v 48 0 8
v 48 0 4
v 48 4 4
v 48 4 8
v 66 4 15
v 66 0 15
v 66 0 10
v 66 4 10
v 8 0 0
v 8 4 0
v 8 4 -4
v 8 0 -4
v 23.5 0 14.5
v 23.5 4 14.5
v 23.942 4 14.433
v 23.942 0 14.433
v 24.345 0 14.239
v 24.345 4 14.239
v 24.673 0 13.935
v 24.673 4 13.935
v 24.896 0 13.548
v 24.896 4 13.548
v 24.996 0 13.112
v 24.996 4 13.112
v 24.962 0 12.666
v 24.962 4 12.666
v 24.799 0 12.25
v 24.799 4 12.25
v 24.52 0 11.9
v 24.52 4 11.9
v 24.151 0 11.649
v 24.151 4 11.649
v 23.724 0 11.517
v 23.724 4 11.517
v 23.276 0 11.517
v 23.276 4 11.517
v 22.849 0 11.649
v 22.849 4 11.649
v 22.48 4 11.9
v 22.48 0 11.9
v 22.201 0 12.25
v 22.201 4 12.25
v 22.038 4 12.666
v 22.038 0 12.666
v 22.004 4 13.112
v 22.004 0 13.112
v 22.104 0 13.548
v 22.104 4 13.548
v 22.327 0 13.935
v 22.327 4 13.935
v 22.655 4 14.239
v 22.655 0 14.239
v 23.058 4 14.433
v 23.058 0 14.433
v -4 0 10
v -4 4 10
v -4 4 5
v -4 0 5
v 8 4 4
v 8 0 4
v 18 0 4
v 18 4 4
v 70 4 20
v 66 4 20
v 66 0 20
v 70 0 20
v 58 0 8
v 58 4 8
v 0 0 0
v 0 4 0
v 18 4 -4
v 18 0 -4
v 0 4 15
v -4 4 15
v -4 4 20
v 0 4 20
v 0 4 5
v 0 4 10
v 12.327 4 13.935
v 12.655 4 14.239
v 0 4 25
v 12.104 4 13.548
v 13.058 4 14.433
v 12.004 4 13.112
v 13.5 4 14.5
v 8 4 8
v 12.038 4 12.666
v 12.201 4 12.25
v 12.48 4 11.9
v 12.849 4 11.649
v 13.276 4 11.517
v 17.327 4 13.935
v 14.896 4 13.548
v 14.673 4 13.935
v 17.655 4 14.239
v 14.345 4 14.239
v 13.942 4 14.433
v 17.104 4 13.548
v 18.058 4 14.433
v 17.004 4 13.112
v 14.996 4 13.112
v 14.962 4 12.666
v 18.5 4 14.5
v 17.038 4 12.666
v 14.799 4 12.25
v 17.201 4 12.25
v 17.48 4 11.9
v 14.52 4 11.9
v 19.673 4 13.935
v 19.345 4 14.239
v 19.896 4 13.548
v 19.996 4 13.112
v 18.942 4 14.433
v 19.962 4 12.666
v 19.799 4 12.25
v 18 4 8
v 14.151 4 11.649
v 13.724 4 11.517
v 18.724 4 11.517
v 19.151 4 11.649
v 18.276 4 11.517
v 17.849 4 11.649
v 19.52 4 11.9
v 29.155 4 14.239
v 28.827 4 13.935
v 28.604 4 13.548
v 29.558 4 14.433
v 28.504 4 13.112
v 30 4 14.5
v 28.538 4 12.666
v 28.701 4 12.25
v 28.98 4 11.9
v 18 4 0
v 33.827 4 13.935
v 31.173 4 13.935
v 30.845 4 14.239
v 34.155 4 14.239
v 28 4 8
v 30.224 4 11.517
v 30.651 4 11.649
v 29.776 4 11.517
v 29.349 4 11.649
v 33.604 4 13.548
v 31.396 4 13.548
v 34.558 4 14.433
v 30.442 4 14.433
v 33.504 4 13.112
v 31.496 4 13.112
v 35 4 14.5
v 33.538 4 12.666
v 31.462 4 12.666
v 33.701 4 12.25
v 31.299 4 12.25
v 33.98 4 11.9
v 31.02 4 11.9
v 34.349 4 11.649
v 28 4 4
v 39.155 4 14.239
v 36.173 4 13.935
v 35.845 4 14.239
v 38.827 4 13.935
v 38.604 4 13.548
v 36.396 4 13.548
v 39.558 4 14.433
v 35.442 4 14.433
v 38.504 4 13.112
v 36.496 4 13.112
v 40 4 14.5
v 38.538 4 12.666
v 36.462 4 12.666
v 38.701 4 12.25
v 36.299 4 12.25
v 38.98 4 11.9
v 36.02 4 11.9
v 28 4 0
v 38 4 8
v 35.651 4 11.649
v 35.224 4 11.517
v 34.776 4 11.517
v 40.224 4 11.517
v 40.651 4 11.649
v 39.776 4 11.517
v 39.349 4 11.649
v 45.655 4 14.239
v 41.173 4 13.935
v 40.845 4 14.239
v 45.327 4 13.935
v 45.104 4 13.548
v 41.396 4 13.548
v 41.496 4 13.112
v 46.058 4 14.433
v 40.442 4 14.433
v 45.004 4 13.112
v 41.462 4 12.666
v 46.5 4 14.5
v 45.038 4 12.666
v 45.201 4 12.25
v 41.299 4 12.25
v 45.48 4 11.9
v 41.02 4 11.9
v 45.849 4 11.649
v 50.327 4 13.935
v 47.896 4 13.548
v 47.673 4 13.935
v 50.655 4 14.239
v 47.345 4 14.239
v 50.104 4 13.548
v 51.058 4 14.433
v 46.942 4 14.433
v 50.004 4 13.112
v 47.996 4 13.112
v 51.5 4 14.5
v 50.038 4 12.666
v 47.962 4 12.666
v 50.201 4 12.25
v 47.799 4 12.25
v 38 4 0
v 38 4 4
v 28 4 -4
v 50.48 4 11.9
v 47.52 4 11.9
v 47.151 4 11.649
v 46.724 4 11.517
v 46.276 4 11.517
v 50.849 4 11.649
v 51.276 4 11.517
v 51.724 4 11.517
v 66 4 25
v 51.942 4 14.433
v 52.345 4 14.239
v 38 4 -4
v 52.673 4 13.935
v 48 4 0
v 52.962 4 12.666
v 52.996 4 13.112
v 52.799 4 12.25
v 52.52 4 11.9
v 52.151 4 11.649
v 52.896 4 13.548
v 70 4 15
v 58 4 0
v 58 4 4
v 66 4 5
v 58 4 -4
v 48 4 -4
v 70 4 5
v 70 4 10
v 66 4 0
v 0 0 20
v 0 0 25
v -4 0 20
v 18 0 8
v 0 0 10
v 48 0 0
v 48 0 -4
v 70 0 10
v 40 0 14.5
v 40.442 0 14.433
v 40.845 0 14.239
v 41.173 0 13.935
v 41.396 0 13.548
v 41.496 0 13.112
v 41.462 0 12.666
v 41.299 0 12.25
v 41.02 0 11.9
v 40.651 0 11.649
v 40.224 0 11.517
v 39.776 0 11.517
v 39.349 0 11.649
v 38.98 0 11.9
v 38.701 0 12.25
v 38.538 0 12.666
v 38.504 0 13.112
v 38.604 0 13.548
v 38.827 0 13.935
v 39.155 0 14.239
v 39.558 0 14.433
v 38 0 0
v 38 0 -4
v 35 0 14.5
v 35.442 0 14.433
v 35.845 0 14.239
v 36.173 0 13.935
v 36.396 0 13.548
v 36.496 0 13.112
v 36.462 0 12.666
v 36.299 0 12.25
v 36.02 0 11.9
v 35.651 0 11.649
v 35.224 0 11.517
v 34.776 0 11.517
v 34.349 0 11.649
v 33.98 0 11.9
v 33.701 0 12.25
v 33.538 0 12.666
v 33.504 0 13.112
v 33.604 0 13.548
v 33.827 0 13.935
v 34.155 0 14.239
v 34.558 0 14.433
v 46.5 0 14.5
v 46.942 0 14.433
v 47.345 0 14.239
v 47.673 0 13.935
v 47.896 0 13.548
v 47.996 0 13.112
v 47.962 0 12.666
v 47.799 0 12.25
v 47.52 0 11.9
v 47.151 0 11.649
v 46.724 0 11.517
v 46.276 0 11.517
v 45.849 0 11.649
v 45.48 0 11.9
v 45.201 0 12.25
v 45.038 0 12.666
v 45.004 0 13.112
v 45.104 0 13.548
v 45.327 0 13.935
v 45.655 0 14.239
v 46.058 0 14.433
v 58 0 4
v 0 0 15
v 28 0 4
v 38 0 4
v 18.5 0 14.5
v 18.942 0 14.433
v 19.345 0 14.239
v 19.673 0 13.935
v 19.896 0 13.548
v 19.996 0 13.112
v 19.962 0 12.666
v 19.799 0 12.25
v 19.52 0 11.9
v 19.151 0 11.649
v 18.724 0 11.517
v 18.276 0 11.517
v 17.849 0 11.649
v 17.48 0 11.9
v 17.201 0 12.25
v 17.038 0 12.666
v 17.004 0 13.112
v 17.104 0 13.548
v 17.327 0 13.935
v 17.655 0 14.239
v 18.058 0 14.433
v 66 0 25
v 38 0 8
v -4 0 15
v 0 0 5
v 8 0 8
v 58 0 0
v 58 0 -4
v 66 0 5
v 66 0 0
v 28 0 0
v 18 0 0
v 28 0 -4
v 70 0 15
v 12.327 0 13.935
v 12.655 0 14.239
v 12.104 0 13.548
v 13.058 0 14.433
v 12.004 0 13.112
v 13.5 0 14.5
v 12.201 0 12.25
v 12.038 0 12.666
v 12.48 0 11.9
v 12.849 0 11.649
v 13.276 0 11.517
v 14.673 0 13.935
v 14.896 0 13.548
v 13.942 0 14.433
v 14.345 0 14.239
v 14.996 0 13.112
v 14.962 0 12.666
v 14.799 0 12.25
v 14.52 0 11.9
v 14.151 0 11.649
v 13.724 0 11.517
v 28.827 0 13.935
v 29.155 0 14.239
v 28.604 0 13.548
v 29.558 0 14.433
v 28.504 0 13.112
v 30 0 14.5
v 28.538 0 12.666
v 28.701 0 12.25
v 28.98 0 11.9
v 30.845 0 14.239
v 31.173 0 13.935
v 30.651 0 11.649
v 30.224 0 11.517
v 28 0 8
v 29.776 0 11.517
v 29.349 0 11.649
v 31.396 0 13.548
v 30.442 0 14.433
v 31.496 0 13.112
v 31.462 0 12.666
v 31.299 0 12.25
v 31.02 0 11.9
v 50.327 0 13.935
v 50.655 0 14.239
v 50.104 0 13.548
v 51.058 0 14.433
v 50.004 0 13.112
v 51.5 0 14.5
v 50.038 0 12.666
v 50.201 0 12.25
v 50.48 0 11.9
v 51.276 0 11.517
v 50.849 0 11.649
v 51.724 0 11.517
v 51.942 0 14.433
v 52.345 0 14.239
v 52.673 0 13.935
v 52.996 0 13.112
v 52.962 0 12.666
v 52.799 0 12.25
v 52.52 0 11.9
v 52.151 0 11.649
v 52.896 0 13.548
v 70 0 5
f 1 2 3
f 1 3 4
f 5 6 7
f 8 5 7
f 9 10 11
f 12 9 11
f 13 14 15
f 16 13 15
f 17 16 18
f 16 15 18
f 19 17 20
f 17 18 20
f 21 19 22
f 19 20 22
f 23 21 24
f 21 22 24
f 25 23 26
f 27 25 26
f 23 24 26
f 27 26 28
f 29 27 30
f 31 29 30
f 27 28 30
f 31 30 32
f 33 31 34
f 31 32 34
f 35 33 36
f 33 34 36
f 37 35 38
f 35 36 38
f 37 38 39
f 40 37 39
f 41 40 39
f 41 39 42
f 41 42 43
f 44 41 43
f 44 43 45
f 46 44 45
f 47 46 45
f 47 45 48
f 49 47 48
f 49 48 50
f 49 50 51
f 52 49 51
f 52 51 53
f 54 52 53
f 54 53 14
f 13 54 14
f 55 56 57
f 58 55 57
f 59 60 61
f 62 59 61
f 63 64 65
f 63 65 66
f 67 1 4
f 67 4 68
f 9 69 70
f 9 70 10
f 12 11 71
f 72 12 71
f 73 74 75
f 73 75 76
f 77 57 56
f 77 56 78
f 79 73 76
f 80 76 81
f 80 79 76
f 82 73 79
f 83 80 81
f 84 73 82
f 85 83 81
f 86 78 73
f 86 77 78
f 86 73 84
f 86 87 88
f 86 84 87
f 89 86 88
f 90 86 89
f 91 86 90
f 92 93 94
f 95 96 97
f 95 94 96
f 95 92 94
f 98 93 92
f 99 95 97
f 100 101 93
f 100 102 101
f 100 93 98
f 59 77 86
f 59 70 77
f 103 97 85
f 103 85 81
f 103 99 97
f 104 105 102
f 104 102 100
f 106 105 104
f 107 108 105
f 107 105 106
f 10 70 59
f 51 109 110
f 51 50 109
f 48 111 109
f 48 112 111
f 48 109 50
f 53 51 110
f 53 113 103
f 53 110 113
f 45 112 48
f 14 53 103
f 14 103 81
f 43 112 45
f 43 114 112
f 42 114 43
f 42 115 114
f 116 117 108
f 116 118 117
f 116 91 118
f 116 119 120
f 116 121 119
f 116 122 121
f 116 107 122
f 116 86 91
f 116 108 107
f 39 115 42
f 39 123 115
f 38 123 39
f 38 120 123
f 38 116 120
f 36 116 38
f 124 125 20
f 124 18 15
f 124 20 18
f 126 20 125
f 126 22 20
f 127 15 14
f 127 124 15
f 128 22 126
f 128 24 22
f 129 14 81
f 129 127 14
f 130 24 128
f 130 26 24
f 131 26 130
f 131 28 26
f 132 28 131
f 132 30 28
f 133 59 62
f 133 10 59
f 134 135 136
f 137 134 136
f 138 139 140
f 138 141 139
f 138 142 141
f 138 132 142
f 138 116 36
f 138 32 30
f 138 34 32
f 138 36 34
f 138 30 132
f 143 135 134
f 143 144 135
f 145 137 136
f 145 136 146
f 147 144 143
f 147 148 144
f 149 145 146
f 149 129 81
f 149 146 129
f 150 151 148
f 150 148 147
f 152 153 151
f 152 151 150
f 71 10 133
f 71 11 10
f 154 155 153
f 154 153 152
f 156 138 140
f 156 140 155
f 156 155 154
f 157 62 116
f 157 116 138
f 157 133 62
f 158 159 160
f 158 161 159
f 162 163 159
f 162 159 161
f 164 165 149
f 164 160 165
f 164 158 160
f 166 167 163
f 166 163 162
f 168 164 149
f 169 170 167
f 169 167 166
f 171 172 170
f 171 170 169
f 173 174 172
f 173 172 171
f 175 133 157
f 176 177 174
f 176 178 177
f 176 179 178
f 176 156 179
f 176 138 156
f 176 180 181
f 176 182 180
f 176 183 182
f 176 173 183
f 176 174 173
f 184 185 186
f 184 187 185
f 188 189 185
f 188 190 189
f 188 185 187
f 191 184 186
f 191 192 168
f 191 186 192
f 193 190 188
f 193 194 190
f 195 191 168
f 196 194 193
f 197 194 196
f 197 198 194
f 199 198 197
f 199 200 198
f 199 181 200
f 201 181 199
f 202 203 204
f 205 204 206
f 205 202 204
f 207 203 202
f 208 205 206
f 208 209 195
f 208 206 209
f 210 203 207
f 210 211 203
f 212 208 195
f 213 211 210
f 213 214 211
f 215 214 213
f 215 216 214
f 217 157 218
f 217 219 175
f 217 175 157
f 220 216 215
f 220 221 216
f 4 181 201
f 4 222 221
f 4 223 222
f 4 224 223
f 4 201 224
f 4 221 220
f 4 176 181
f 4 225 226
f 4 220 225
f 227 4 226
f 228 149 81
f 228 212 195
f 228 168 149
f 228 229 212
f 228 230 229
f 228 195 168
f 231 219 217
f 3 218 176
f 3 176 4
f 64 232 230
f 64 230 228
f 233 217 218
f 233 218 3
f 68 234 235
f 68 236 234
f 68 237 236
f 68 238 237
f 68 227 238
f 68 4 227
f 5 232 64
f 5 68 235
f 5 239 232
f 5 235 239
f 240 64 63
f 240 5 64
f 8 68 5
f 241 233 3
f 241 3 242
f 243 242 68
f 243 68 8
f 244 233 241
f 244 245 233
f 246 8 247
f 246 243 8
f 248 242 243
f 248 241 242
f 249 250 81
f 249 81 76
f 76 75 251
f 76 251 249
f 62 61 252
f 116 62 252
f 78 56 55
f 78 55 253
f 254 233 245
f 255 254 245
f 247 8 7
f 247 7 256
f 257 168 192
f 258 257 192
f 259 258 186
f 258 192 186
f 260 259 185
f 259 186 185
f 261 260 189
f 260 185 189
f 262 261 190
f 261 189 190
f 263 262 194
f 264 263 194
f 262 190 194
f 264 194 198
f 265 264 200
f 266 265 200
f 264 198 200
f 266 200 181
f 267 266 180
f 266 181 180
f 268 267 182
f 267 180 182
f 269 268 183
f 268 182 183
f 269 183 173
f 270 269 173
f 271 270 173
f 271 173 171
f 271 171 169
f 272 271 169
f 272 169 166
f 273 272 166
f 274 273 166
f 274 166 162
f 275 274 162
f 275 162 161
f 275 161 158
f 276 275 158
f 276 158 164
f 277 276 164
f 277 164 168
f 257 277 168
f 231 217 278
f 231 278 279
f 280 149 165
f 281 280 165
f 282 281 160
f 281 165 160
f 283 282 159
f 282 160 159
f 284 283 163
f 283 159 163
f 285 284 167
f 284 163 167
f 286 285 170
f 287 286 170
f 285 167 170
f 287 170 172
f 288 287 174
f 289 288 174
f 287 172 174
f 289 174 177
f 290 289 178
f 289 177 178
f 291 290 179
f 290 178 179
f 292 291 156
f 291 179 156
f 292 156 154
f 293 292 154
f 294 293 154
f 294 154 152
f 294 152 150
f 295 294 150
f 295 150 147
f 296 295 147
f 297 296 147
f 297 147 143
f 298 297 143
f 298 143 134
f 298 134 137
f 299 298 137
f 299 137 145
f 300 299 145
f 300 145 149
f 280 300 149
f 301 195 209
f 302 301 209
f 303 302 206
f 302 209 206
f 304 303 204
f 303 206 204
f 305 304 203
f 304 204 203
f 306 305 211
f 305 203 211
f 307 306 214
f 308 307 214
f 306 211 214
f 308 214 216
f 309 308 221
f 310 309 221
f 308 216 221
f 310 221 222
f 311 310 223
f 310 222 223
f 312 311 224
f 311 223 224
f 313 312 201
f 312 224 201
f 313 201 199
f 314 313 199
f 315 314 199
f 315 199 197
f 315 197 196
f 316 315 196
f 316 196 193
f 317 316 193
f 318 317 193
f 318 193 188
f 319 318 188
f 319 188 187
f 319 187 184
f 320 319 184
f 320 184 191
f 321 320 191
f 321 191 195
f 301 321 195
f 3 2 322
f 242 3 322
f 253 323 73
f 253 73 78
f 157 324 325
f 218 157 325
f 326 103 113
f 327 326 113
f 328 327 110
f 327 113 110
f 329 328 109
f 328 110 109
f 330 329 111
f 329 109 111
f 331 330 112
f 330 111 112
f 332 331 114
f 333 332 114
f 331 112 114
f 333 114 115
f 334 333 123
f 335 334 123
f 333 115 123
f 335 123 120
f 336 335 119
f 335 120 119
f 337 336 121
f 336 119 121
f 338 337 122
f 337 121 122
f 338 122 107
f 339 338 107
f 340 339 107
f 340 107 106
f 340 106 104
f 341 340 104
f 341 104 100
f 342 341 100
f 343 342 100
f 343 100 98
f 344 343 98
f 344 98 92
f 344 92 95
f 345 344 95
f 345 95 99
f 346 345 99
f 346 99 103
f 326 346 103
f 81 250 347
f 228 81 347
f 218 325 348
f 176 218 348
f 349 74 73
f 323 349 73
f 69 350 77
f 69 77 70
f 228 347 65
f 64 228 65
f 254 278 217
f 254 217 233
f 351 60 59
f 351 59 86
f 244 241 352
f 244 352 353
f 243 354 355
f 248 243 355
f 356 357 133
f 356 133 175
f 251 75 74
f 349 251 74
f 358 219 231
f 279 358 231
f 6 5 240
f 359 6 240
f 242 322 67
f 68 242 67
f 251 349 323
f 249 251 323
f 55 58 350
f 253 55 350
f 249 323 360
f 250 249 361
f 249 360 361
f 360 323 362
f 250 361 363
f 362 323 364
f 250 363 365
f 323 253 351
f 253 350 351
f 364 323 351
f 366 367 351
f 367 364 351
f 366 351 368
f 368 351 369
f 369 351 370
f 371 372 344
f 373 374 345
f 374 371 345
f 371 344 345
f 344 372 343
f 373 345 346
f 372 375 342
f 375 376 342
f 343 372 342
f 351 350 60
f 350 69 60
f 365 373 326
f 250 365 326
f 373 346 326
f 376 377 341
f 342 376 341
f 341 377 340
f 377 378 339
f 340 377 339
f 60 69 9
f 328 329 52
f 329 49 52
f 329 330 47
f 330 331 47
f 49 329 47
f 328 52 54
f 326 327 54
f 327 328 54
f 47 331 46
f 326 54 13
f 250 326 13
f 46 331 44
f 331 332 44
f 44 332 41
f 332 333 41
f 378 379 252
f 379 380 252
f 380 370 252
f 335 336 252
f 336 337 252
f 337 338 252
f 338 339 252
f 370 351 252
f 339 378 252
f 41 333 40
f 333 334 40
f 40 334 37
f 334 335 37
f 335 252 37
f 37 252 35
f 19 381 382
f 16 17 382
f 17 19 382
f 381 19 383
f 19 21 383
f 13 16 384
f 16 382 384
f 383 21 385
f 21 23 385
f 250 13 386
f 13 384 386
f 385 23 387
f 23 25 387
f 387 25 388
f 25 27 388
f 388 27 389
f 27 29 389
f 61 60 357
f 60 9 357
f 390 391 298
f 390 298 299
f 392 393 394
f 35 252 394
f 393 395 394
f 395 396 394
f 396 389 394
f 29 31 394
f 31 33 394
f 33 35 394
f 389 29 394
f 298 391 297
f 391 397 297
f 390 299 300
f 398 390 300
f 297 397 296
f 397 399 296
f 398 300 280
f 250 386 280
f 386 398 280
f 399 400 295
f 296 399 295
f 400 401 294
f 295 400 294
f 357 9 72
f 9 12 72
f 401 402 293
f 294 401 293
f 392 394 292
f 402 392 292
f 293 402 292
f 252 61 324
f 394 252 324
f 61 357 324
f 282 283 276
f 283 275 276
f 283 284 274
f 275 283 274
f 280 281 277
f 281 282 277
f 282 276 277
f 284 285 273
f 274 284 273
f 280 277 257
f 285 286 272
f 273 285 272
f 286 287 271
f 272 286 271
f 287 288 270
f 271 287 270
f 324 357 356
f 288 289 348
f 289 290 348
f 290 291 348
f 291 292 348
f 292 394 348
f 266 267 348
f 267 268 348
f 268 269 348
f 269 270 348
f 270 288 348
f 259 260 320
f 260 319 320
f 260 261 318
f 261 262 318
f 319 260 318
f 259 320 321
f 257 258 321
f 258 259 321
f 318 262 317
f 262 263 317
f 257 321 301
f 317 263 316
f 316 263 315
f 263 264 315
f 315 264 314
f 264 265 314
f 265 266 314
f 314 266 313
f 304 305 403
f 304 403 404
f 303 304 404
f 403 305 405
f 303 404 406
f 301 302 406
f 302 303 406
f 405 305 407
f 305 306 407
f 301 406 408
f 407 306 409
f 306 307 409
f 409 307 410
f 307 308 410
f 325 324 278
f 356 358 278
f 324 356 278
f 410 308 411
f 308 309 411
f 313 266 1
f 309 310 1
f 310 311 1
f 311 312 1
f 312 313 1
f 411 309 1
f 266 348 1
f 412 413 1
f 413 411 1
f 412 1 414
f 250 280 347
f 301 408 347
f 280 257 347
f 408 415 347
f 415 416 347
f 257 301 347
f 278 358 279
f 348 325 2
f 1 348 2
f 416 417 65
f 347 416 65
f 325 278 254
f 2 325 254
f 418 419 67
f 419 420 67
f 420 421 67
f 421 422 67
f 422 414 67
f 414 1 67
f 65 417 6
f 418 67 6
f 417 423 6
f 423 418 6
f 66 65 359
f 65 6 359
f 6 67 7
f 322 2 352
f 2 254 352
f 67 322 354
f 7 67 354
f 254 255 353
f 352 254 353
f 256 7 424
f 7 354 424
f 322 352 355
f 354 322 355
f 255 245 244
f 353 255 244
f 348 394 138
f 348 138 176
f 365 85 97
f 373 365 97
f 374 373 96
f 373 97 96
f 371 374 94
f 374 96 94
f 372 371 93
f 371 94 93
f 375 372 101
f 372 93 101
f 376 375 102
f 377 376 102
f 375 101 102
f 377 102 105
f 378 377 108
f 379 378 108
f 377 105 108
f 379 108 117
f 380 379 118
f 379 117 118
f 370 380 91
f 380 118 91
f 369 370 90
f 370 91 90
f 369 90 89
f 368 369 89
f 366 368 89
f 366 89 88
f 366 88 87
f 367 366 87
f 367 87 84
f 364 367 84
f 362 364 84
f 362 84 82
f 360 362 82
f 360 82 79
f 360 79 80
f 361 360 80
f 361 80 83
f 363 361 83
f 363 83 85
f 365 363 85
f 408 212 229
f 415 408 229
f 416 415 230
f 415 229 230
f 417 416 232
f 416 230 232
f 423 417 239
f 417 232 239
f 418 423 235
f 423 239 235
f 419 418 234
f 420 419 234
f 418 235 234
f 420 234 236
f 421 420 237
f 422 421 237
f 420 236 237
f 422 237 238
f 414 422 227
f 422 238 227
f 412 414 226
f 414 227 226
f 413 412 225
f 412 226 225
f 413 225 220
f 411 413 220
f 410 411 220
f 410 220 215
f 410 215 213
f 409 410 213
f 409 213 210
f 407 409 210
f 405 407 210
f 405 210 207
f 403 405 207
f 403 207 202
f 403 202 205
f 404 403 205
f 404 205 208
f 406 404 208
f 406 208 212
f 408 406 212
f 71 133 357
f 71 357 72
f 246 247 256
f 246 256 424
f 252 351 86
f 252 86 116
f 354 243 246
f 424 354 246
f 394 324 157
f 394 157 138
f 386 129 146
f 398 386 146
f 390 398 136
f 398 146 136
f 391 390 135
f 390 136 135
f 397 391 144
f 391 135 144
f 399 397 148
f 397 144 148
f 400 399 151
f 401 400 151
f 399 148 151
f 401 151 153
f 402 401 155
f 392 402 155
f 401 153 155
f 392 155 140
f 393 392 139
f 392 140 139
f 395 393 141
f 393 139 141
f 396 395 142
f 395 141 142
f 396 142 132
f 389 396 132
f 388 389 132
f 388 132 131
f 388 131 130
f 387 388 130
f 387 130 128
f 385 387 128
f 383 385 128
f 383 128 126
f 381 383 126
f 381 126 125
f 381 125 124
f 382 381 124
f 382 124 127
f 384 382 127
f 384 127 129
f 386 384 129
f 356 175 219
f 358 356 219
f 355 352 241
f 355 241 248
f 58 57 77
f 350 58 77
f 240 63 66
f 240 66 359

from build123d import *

# Parameters (mm, degrees)
SKETCH1_W           = 66
SKETCH1_H           = 25
BOSS_EXTRUDE1_DEPTH = 4
SKETCH2_W           = 4
SKETCH2_H           = 5
BOSS_EXTRUDE2_DEPTH = 4
LPATTERN1_COUNT     = 2
LPATTERN1_PITCH     = 10
SKETCH3_W           = 10
SKETCH3_H           = 4
BOSS_EXTRUDE3_DEPTH = 4
LPATTERN2_COUNT     = 2
LPATTERN2_PITCH     = 20
LPATTERN2_COL_COUNT = 2
LPATTERN2_COL_PITCH = 20
SKETCH4_W           = 10
SKETCH4_H           = 4
CUT_EXTRUDE1_DEPTH  = 75.437893576
SKETCH8_R           = 1.5
CUT_EXTRUDE4_DEPTH  = 75.437893576


with BuildPart() as part:
    # Sketch1 → Boss-Extrude1 (new body)
    with BuildSketch(Plane(origin=(0, 0, 0), x_dir=(1, 0, 0), z_dir=(0, 1, 0))):
        with Locations((33, -12.5)):
            Rectangle(SKETCH1_W, SKETCH1_H)
    extrude(amount=BOSS_EXTRUDE1_DEPTH)

    # Sketch2 → Boss-Extrude2 (add, through all)
    with BuildSketch(Plane(origin=(0, 4, 0), x_dir=(1, 0, 0), z_dir=(0, 1, 0))):
        with Locations((-2, -17.5)):
            Rectangle(SKETCH2_W, SKETCH2_H)
        with Locations((68, -17.5)):
            Rectangle(SKETCH2_W, SKETCH2_H)
    boss_extrude2 = extrude(amount=-BOSS_EXTRUDE2_DEPTH)

    # LPattern1: Boss-Extrude2 ×2
    with Locations(*[(0, 0, -i * LPATTERN1_PITCH) for i in range(1, LPATTERN1_COUNT)]):
        add(boss_extrude2)

    # Sketch3 → Boss-Extrude3 (add, through all)
    with BuildSketch(Plane(origin=(0, 4, 0), x_dir=(1, 0, 0), z_dir=(0, 1, 0))):
        with Locations((33, 2)):
            Rectangle(SKETCH3_W, SKETCH3_H)
    boss_extrude3 = extrude(amount=-BOSS_EXTRUDE3_DEPTH)

    # LPattern2: Boss-Extrude3 ×2
    with Locations(*[(i * LPATTERN2_PITCH, 0, 0) for i in range(1, LPATTERN2_COUNT)]):
        add(boss_extrude3)

    # LPattern2 col: Boss-Extrude3 ×2
    with Locations(*[(-i * LPATTERN2_COL_PITCH, 0, 0) for i in range(1, LPATTERN2_COL_COUNT)]):
        add(boss_extrude3)

    # Sketch4 → Cut-Extrude1 (cut, through all)
    with BuildSketch(Plane.XZ):
        with Locations((13, 6)):
            Rectangle(SKETCH4_W, SKETCH4_H)
        with Locations((33, 6)):
            Rectangle(SKETCH4_W, SKETCH4_H)
        with Locations((53, 6)):
            Rectangle(SKETCH4_W, SKETCH4_H)
    extrude(amount=-CUT_EXTRUDE1_DEPTH, mode=Mode.SUBTRACT)

    # Sketch8 → Cut-Extrude4 (cut, through all)
    with BuildSketch(Plane(origin=(0, 4, 0), x_dir=(1, 0, 0), z_dir=(0, 1, 0))):
        with Locations(Location((51.5, -13, 0), (0, 0, 270))):
            Circle(SKETCH8_R)
        with Locations(Location((46.5, -13, 0), (0, 0, 270))):
            Circle(SKETCH8_R)
        with Locations(Location((40, -13, 0), (0, 0, 270))):
            Circle(SKETCH8_R)
        with Locations(Location((35, -13, 0), (0, 0, 270))):
            Circle(SKETCH8_R)
        with Locations(Location((30, -13, 0), (0, 0, 270))):
            Circle(SKETCH8_R)
        with Locations(Location((23.5, -13, 0), (0, 0, 270))):
            Circle(SKETCH8_R)
        with Locations(Location((18.5, -13, 0), (0, 0, 270))):
            Circle(SKETCH8_R)
        with Locations(Location((13.5, -13, 0), (0, 0, 270))):
            Circle(SKETCH8_R)
    extrude(amount=-CUT_EXTRUDE4_DEPTH, mode=Mode.SUBTRACT)


solid = part.part
